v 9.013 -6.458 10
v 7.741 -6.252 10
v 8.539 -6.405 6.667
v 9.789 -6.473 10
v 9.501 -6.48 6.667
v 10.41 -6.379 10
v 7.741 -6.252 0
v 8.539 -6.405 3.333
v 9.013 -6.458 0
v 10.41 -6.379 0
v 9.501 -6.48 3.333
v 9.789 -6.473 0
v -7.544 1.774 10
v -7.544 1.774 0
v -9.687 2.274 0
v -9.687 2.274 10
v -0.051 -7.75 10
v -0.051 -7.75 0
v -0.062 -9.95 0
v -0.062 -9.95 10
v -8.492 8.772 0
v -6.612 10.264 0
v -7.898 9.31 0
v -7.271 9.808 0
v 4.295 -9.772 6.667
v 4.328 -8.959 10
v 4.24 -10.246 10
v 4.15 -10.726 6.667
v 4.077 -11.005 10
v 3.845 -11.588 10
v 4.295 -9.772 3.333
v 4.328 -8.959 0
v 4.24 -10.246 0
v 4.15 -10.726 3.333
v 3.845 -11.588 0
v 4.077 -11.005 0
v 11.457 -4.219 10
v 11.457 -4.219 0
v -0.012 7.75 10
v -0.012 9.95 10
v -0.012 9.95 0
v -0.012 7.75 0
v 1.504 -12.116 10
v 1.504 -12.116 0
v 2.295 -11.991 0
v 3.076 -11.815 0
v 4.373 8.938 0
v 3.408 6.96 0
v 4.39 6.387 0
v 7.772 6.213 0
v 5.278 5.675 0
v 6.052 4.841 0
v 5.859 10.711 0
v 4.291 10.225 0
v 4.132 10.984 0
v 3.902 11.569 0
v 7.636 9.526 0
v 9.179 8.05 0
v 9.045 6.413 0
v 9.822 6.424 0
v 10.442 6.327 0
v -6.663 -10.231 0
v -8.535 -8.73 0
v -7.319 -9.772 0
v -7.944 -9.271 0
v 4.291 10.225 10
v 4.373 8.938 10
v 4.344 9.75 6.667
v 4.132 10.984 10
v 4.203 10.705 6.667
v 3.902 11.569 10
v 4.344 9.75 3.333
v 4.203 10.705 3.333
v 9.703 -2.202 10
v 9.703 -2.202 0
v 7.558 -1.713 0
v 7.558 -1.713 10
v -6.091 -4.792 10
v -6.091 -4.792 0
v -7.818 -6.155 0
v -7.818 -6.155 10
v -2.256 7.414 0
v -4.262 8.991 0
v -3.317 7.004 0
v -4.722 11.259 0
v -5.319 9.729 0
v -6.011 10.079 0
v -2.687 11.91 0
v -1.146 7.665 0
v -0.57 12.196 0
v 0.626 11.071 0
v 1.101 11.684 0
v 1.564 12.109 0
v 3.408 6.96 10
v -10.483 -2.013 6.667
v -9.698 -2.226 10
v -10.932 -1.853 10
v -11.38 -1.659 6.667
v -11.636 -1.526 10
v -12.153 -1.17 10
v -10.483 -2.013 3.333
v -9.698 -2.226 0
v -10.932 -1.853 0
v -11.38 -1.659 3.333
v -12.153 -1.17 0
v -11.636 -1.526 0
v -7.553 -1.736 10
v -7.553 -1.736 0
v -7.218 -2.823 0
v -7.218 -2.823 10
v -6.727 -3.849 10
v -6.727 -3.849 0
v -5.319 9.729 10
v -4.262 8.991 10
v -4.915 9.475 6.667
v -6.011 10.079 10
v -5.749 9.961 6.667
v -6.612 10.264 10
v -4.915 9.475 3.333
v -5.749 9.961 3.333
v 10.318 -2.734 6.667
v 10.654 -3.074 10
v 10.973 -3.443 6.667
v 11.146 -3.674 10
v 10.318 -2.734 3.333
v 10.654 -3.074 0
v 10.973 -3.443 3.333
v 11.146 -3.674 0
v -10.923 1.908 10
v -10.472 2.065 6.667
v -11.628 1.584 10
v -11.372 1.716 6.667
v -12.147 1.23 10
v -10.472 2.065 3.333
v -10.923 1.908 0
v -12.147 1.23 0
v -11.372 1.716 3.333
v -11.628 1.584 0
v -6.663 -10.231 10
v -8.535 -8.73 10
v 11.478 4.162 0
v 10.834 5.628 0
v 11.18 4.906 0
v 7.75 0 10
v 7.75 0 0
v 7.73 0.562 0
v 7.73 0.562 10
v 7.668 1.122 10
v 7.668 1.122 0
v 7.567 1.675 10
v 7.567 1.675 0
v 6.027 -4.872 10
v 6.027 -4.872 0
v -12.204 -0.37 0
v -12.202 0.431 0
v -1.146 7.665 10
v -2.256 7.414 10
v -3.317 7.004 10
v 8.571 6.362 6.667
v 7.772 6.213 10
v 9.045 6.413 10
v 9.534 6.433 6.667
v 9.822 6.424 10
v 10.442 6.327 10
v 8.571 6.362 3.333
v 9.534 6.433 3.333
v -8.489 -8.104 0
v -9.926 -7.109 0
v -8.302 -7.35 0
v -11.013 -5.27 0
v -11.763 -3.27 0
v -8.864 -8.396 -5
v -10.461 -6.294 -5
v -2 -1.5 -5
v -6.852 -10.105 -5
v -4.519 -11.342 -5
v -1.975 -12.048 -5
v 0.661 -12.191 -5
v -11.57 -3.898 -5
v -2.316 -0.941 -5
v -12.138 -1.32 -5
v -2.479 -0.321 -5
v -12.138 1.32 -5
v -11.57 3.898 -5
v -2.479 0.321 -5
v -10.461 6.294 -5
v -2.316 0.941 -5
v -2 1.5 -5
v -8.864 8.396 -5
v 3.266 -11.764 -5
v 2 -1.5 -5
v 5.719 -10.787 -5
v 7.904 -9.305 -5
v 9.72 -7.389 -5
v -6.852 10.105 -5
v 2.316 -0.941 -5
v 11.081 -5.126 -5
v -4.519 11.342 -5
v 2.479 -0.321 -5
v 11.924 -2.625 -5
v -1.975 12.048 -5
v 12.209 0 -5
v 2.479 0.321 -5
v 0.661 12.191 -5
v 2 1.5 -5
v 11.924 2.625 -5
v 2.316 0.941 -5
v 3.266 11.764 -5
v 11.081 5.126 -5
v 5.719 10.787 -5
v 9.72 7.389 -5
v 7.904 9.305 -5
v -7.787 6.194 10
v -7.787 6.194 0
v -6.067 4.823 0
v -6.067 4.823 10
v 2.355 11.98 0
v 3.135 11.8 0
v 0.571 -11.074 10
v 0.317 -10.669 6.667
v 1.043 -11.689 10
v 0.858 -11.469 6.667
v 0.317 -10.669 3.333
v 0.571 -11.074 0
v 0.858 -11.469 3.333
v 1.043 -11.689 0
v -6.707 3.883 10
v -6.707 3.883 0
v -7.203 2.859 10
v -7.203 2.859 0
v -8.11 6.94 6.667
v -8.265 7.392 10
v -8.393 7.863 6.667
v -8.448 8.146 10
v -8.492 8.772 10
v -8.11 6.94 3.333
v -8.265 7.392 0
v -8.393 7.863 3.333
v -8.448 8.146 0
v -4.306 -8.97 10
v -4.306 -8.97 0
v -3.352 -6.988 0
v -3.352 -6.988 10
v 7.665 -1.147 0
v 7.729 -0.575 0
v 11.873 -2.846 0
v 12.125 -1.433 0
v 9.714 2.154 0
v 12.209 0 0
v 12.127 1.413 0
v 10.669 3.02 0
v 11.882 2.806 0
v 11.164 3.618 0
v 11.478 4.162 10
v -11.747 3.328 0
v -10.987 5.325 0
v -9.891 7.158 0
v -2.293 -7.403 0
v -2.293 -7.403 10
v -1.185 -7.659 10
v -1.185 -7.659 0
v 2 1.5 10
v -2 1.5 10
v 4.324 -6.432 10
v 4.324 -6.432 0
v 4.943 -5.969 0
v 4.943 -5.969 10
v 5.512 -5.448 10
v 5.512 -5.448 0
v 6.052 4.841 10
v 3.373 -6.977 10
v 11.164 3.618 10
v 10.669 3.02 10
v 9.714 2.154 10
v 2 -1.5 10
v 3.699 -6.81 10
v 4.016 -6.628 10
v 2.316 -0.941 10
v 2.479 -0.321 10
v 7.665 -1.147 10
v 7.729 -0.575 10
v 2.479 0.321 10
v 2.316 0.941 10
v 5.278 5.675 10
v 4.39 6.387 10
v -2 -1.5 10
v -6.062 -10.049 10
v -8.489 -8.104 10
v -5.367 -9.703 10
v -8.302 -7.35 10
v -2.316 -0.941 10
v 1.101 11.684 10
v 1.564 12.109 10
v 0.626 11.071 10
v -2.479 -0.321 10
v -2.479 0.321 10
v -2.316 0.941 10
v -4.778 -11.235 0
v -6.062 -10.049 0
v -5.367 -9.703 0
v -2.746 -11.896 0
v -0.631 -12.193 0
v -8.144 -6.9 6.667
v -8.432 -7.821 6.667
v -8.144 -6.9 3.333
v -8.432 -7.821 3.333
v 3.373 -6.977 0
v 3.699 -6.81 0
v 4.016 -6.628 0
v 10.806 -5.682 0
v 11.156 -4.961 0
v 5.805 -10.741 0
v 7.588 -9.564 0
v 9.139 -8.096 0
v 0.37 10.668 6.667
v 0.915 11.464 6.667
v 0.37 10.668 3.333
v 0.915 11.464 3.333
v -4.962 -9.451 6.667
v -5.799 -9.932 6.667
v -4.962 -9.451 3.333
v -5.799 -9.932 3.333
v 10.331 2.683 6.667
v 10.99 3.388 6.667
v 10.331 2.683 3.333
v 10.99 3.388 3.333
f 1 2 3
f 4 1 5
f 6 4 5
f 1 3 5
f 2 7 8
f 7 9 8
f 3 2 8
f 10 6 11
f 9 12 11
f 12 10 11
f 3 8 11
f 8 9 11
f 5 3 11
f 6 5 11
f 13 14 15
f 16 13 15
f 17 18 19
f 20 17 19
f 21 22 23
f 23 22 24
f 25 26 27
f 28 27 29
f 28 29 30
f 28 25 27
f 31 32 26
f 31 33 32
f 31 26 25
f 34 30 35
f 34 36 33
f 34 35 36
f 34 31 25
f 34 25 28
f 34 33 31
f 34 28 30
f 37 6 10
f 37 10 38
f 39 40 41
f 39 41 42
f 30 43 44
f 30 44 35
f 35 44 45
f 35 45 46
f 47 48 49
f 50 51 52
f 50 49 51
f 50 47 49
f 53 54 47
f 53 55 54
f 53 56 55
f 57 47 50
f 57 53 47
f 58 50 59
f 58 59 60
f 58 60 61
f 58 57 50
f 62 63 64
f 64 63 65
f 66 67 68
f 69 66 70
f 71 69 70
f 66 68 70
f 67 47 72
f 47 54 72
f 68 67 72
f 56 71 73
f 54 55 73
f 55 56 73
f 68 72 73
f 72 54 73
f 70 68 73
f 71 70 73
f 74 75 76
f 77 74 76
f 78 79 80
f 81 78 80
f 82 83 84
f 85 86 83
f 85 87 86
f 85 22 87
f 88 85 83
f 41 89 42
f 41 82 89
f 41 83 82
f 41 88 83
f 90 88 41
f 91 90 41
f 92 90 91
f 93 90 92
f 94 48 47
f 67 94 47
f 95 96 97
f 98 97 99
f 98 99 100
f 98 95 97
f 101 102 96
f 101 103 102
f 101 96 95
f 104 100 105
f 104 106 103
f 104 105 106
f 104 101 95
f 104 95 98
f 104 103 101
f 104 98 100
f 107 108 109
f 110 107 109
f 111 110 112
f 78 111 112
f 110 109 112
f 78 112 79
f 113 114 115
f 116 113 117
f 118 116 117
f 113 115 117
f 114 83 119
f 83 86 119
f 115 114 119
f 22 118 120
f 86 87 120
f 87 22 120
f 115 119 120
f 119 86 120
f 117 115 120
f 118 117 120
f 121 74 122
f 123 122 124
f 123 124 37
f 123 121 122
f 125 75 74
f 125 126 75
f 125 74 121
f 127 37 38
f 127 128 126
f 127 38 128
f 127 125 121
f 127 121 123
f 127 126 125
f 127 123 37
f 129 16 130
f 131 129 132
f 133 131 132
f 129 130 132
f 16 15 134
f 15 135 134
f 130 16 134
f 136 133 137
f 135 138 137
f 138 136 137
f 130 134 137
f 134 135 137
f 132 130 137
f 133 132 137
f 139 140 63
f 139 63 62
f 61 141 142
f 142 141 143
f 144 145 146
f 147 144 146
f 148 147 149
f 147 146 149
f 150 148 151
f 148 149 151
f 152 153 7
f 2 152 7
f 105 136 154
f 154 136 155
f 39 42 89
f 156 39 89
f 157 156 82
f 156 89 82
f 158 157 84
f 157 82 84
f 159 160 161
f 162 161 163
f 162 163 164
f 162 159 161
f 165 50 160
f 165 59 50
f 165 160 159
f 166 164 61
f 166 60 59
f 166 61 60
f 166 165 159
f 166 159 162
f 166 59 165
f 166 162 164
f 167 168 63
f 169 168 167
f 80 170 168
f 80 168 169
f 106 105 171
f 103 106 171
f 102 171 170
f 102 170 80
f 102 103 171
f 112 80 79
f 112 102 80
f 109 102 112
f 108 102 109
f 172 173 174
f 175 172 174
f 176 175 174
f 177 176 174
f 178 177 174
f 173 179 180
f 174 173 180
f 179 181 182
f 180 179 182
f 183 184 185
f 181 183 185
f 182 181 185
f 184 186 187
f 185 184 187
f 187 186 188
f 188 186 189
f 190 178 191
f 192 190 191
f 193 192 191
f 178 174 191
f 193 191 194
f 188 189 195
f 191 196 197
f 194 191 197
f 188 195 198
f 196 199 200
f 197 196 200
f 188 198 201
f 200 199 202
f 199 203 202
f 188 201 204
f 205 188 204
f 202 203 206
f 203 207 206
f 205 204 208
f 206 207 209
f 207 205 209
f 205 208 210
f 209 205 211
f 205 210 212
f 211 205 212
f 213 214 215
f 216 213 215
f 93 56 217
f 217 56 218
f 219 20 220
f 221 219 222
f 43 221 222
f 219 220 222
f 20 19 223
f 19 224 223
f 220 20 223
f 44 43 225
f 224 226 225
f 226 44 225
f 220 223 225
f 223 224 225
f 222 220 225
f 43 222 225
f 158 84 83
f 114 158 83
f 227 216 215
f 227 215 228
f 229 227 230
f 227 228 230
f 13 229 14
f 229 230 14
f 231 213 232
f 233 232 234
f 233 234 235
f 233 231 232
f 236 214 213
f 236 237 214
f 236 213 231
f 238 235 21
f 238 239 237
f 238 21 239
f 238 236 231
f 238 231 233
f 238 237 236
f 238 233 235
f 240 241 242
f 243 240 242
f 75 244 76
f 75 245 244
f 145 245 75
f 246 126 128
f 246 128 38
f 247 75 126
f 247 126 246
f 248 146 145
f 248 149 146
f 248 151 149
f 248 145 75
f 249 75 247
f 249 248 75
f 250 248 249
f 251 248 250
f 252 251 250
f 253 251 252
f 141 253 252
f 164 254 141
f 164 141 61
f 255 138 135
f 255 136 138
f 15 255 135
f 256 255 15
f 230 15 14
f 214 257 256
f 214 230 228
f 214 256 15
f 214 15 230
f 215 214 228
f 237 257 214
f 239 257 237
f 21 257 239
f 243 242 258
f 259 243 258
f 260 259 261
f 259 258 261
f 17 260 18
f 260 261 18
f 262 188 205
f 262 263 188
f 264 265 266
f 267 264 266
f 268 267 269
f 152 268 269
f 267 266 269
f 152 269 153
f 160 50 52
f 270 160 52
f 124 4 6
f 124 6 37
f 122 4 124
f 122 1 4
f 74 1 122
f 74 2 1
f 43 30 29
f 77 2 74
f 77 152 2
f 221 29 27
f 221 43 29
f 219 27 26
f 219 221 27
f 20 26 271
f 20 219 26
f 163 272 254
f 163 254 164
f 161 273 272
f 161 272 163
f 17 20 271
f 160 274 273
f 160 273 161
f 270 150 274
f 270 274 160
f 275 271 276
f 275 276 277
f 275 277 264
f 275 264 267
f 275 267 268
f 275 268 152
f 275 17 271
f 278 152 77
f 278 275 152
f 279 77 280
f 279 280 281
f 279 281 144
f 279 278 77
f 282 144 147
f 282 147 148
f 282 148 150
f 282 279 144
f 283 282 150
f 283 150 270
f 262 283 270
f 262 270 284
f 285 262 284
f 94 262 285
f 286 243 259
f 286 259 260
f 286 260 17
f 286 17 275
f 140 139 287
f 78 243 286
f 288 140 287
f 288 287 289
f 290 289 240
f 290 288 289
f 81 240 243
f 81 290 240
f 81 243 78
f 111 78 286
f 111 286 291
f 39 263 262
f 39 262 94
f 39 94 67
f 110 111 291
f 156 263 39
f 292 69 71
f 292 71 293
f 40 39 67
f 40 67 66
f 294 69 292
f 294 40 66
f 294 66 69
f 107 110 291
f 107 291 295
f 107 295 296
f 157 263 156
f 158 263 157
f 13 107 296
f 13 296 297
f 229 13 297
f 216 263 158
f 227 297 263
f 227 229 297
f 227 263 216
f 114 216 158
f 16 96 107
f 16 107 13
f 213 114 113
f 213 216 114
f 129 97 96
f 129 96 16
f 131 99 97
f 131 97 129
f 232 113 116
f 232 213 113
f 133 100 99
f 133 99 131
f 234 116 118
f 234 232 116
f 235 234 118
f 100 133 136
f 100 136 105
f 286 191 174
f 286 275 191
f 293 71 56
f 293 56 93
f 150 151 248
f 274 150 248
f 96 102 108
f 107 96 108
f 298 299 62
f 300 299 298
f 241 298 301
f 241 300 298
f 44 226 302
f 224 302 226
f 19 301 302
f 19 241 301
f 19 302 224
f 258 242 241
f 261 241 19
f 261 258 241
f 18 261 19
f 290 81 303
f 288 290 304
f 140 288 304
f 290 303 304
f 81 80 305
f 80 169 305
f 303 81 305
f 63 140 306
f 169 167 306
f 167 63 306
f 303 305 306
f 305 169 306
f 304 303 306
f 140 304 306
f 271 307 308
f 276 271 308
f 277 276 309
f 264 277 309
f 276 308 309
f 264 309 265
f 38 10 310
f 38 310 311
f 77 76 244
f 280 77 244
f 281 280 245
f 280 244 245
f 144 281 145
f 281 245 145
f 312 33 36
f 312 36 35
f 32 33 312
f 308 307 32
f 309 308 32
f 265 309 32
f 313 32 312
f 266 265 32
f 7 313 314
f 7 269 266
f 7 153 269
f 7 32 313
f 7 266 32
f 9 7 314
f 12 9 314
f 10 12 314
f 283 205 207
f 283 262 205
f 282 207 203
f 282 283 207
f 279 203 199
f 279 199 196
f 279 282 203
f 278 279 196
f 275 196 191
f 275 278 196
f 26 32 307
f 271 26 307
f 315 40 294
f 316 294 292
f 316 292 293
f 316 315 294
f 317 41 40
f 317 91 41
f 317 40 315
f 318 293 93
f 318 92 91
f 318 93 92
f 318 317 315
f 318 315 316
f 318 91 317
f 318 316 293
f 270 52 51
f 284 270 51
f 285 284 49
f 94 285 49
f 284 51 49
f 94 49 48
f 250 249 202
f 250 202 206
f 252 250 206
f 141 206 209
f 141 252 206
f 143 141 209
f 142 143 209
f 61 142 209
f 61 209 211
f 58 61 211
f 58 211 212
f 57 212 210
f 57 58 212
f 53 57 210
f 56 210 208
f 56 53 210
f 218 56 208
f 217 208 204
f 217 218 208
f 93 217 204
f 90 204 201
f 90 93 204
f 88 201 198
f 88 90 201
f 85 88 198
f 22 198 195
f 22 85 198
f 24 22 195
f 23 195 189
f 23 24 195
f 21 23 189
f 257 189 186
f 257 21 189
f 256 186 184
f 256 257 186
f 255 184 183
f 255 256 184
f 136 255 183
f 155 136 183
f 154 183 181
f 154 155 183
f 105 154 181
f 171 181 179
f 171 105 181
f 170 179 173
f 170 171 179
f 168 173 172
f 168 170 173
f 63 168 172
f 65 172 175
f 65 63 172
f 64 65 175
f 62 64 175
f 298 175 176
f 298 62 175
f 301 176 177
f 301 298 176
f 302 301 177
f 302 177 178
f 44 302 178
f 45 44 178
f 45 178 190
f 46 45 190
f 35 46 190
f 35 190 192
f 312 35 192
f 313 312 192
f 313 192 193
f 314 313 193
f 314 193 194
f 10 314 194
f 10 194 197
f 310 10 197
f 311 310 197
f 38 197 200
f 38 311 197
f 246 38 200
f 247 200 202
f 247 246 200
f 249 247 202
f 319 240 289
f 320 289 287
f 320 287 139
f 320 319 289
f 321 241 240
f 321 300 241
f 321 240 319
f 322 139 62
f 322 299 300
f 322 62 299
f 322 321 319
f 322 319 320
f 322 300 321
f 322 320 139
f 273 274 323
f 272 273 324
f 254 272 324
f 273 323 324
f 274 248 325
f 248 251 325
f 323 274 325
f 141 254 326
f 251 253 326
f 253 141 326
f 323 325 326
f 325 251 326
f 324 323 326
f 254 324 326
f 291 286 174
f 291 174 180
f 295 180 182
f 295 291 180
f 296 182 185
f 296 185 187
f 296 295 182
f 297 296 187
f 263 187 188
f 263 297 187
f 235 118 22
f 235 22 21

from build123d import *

# Parameters (mm, degrees)
F1_DEPTH        = 10
F2_DEPTH        = 10
F2_COPIES_COUNT = 7
F4_R            = 12.2091154471
F5_DEPTH        = 5


# Not quite as in the source:
# - a pattern or mirror of a feature is missing from the dataset's text; its kind, count and spacing are read off the source's solid


with BuildPart() as f1:
    # F0 (on Top) → F1 (new body)
    with BuildSketch(Plane.XY):
        with BuildLine():
            ThreePointArc((4.3237516011, -6.4317705254), (6.8400137028, -3.6437223475), (7.75, 0))
            ThreePointArc((7.75, 0), (6.5755629687, 4.1017644551), (3.4082008658, 6.9603639889))
            ThreePointArc((3.4082008658, 6.9603639889), (1.7433706712, 7.5513680021), (-0.0120479028, 7.7499906354))
            ThreePointArc((-0.0120479028, 7.7499906354), (-5.6679911875, 5.2854872905), (-7.7319524669, -0.5285934635))
            ThreePointArc((-7.7319524669, -0.5285934635), (-3.4082008658, -6.9603639889), (4.3237516011, -6.4317705254))
        make_face()
        with BuildLine():
            ThreePointArc((-2, -1.5), (-2.5, 0), (-2, 1.5))
            Line((-2, 1.5), (2, 1.5))
            ThreePointArc((2, 1.5), (2.5, 0), (2, -1.5))
            Line((2, -1.5), (-2, -1.5))
        make_face(mode=Mode.SUBTRACT)
    extrude(amount=F1_DEPTH)

    # F0 (on Top) → F2 (join)
    with BuildSketch(Plane.XY):
        with BuildLine():
            ThreePointArc((-0.0120479028, 7.7499906354), (1.7433706712, 7.5513680021), (3.4082008658, 6.9603639889))
            Line((3.4082008658, 6.9603639889), (4.3726173887, 8.9377108908))
            add(Edge.make_bspline(
                [(4.3726173887, 8.9377108908), (4.3837213667, 9.6011226956), (4.2995730436, 10.8287649694), (3.902399388, 11.5686550219)],
                knots=[0, 0, 0, 0, 2.6726339048, 2.6726339048, 2.6726339048, 2.6726339048], degree=3))
            Line((3.902399388, 11.5686550219), (1.5639112325, 12.1085375524))
            add(Edge.make_bspline(
                [(-0.0120479028, 9.9499906354), (0.2687925016, 10.5511288793), (0.8825874647, 11.6176382491), (1.5639112325, 12.1085375524)],
                knots=[0, 0, 0, 0, 2.6726339048, 2.6726339048, 2.6726339048, 2.6726339048], degree=3))
            Line((-0.0120479028, 9.9499906354), (-0.0120479028, 7.7499906354))
        make_face()
    f2 = extrude(amount=F2_DEPTH)

    # F2_copies: F2 ×7 about axis
    f2_copies_axis = Axis((0, 0, 0), (0, 0, 1))
    for i in range(1, F2_COPIES_COUNT):
        add(f2.rotate(f2_copies_axis, i * 360 / F2_COPIES_COUNT))

    # F4 (on face) + F0 (on Top) → F5 (join)
    with BuildSketch(Plane.XY):
        Circle(F4_R)
        with BuildLine():
            ThreePointArc((7.75, 0), (6.8400137028, -3.6437223475), (4.3237516011, -6.4317705254))
            ThreePointArc((4.3237516011, -6.4317705254), (-3.4082008658, -6.9603639889), (-7.7319524669, -0.5285934635))
            ThreePointArc((-7.7319524669, -0.5285934635), (-5.6679911875, 5.2854872905), (-0.0120479028, 7.7499906354))
            ThreePointArc((-0.0120479028, 7.7499906354), (1.7433706712, 7.5513680021), (3.4082008658, 6.9603639889))
            ThreePointArc((3.4082008658, 6.9603639889), (6.5755629687, 4.1017644551), (7.75, 0))
        make_face(mode=Mode.SUBTRACT)
    with BuildSketch(Plane.XY):
        with BuildLine():
            ThreePointArc((4.3237516011, -6.4317705254), (6.8400137028, -3.6437223475), (7.75, 0))
            ThreePointArc((7.75, 0), (6.5755629687, 4.1017644551), (3.4082008658, 6.9603639889))
            ThreePointArc((3.4082008658, 6.9603639889), (1.7433706712, 7.5513680021), (-0.0120479028, 7.7499906354))
            ThreePointArc((-0.0120479028, 7.7499906354), (-5.6679911875, 5.2854872905), (-7.7319524669, -0.5285934635))
            ThreePointArc((-7.7319524669, -0.5285934635), (-3.4082008658, -6.9603639889), (4.3237516011, -6.4317705254))
        make_face()
        with BuildLine():
            ThreePointArc((-2, -1.5), (-2.5, 0), (-2, 1.5))
            Line((-2, 1.5), (2, 1.5))
            ThreePointArc((2, 1.5), (2.5, 0), (2, -1.5))
            Line((2, -1.5), (-2, -1.5))
        make_face(mode=Mode.SUBTRACT)
    extrude(amount=-F5_DEPTH)


solid = f1.part
